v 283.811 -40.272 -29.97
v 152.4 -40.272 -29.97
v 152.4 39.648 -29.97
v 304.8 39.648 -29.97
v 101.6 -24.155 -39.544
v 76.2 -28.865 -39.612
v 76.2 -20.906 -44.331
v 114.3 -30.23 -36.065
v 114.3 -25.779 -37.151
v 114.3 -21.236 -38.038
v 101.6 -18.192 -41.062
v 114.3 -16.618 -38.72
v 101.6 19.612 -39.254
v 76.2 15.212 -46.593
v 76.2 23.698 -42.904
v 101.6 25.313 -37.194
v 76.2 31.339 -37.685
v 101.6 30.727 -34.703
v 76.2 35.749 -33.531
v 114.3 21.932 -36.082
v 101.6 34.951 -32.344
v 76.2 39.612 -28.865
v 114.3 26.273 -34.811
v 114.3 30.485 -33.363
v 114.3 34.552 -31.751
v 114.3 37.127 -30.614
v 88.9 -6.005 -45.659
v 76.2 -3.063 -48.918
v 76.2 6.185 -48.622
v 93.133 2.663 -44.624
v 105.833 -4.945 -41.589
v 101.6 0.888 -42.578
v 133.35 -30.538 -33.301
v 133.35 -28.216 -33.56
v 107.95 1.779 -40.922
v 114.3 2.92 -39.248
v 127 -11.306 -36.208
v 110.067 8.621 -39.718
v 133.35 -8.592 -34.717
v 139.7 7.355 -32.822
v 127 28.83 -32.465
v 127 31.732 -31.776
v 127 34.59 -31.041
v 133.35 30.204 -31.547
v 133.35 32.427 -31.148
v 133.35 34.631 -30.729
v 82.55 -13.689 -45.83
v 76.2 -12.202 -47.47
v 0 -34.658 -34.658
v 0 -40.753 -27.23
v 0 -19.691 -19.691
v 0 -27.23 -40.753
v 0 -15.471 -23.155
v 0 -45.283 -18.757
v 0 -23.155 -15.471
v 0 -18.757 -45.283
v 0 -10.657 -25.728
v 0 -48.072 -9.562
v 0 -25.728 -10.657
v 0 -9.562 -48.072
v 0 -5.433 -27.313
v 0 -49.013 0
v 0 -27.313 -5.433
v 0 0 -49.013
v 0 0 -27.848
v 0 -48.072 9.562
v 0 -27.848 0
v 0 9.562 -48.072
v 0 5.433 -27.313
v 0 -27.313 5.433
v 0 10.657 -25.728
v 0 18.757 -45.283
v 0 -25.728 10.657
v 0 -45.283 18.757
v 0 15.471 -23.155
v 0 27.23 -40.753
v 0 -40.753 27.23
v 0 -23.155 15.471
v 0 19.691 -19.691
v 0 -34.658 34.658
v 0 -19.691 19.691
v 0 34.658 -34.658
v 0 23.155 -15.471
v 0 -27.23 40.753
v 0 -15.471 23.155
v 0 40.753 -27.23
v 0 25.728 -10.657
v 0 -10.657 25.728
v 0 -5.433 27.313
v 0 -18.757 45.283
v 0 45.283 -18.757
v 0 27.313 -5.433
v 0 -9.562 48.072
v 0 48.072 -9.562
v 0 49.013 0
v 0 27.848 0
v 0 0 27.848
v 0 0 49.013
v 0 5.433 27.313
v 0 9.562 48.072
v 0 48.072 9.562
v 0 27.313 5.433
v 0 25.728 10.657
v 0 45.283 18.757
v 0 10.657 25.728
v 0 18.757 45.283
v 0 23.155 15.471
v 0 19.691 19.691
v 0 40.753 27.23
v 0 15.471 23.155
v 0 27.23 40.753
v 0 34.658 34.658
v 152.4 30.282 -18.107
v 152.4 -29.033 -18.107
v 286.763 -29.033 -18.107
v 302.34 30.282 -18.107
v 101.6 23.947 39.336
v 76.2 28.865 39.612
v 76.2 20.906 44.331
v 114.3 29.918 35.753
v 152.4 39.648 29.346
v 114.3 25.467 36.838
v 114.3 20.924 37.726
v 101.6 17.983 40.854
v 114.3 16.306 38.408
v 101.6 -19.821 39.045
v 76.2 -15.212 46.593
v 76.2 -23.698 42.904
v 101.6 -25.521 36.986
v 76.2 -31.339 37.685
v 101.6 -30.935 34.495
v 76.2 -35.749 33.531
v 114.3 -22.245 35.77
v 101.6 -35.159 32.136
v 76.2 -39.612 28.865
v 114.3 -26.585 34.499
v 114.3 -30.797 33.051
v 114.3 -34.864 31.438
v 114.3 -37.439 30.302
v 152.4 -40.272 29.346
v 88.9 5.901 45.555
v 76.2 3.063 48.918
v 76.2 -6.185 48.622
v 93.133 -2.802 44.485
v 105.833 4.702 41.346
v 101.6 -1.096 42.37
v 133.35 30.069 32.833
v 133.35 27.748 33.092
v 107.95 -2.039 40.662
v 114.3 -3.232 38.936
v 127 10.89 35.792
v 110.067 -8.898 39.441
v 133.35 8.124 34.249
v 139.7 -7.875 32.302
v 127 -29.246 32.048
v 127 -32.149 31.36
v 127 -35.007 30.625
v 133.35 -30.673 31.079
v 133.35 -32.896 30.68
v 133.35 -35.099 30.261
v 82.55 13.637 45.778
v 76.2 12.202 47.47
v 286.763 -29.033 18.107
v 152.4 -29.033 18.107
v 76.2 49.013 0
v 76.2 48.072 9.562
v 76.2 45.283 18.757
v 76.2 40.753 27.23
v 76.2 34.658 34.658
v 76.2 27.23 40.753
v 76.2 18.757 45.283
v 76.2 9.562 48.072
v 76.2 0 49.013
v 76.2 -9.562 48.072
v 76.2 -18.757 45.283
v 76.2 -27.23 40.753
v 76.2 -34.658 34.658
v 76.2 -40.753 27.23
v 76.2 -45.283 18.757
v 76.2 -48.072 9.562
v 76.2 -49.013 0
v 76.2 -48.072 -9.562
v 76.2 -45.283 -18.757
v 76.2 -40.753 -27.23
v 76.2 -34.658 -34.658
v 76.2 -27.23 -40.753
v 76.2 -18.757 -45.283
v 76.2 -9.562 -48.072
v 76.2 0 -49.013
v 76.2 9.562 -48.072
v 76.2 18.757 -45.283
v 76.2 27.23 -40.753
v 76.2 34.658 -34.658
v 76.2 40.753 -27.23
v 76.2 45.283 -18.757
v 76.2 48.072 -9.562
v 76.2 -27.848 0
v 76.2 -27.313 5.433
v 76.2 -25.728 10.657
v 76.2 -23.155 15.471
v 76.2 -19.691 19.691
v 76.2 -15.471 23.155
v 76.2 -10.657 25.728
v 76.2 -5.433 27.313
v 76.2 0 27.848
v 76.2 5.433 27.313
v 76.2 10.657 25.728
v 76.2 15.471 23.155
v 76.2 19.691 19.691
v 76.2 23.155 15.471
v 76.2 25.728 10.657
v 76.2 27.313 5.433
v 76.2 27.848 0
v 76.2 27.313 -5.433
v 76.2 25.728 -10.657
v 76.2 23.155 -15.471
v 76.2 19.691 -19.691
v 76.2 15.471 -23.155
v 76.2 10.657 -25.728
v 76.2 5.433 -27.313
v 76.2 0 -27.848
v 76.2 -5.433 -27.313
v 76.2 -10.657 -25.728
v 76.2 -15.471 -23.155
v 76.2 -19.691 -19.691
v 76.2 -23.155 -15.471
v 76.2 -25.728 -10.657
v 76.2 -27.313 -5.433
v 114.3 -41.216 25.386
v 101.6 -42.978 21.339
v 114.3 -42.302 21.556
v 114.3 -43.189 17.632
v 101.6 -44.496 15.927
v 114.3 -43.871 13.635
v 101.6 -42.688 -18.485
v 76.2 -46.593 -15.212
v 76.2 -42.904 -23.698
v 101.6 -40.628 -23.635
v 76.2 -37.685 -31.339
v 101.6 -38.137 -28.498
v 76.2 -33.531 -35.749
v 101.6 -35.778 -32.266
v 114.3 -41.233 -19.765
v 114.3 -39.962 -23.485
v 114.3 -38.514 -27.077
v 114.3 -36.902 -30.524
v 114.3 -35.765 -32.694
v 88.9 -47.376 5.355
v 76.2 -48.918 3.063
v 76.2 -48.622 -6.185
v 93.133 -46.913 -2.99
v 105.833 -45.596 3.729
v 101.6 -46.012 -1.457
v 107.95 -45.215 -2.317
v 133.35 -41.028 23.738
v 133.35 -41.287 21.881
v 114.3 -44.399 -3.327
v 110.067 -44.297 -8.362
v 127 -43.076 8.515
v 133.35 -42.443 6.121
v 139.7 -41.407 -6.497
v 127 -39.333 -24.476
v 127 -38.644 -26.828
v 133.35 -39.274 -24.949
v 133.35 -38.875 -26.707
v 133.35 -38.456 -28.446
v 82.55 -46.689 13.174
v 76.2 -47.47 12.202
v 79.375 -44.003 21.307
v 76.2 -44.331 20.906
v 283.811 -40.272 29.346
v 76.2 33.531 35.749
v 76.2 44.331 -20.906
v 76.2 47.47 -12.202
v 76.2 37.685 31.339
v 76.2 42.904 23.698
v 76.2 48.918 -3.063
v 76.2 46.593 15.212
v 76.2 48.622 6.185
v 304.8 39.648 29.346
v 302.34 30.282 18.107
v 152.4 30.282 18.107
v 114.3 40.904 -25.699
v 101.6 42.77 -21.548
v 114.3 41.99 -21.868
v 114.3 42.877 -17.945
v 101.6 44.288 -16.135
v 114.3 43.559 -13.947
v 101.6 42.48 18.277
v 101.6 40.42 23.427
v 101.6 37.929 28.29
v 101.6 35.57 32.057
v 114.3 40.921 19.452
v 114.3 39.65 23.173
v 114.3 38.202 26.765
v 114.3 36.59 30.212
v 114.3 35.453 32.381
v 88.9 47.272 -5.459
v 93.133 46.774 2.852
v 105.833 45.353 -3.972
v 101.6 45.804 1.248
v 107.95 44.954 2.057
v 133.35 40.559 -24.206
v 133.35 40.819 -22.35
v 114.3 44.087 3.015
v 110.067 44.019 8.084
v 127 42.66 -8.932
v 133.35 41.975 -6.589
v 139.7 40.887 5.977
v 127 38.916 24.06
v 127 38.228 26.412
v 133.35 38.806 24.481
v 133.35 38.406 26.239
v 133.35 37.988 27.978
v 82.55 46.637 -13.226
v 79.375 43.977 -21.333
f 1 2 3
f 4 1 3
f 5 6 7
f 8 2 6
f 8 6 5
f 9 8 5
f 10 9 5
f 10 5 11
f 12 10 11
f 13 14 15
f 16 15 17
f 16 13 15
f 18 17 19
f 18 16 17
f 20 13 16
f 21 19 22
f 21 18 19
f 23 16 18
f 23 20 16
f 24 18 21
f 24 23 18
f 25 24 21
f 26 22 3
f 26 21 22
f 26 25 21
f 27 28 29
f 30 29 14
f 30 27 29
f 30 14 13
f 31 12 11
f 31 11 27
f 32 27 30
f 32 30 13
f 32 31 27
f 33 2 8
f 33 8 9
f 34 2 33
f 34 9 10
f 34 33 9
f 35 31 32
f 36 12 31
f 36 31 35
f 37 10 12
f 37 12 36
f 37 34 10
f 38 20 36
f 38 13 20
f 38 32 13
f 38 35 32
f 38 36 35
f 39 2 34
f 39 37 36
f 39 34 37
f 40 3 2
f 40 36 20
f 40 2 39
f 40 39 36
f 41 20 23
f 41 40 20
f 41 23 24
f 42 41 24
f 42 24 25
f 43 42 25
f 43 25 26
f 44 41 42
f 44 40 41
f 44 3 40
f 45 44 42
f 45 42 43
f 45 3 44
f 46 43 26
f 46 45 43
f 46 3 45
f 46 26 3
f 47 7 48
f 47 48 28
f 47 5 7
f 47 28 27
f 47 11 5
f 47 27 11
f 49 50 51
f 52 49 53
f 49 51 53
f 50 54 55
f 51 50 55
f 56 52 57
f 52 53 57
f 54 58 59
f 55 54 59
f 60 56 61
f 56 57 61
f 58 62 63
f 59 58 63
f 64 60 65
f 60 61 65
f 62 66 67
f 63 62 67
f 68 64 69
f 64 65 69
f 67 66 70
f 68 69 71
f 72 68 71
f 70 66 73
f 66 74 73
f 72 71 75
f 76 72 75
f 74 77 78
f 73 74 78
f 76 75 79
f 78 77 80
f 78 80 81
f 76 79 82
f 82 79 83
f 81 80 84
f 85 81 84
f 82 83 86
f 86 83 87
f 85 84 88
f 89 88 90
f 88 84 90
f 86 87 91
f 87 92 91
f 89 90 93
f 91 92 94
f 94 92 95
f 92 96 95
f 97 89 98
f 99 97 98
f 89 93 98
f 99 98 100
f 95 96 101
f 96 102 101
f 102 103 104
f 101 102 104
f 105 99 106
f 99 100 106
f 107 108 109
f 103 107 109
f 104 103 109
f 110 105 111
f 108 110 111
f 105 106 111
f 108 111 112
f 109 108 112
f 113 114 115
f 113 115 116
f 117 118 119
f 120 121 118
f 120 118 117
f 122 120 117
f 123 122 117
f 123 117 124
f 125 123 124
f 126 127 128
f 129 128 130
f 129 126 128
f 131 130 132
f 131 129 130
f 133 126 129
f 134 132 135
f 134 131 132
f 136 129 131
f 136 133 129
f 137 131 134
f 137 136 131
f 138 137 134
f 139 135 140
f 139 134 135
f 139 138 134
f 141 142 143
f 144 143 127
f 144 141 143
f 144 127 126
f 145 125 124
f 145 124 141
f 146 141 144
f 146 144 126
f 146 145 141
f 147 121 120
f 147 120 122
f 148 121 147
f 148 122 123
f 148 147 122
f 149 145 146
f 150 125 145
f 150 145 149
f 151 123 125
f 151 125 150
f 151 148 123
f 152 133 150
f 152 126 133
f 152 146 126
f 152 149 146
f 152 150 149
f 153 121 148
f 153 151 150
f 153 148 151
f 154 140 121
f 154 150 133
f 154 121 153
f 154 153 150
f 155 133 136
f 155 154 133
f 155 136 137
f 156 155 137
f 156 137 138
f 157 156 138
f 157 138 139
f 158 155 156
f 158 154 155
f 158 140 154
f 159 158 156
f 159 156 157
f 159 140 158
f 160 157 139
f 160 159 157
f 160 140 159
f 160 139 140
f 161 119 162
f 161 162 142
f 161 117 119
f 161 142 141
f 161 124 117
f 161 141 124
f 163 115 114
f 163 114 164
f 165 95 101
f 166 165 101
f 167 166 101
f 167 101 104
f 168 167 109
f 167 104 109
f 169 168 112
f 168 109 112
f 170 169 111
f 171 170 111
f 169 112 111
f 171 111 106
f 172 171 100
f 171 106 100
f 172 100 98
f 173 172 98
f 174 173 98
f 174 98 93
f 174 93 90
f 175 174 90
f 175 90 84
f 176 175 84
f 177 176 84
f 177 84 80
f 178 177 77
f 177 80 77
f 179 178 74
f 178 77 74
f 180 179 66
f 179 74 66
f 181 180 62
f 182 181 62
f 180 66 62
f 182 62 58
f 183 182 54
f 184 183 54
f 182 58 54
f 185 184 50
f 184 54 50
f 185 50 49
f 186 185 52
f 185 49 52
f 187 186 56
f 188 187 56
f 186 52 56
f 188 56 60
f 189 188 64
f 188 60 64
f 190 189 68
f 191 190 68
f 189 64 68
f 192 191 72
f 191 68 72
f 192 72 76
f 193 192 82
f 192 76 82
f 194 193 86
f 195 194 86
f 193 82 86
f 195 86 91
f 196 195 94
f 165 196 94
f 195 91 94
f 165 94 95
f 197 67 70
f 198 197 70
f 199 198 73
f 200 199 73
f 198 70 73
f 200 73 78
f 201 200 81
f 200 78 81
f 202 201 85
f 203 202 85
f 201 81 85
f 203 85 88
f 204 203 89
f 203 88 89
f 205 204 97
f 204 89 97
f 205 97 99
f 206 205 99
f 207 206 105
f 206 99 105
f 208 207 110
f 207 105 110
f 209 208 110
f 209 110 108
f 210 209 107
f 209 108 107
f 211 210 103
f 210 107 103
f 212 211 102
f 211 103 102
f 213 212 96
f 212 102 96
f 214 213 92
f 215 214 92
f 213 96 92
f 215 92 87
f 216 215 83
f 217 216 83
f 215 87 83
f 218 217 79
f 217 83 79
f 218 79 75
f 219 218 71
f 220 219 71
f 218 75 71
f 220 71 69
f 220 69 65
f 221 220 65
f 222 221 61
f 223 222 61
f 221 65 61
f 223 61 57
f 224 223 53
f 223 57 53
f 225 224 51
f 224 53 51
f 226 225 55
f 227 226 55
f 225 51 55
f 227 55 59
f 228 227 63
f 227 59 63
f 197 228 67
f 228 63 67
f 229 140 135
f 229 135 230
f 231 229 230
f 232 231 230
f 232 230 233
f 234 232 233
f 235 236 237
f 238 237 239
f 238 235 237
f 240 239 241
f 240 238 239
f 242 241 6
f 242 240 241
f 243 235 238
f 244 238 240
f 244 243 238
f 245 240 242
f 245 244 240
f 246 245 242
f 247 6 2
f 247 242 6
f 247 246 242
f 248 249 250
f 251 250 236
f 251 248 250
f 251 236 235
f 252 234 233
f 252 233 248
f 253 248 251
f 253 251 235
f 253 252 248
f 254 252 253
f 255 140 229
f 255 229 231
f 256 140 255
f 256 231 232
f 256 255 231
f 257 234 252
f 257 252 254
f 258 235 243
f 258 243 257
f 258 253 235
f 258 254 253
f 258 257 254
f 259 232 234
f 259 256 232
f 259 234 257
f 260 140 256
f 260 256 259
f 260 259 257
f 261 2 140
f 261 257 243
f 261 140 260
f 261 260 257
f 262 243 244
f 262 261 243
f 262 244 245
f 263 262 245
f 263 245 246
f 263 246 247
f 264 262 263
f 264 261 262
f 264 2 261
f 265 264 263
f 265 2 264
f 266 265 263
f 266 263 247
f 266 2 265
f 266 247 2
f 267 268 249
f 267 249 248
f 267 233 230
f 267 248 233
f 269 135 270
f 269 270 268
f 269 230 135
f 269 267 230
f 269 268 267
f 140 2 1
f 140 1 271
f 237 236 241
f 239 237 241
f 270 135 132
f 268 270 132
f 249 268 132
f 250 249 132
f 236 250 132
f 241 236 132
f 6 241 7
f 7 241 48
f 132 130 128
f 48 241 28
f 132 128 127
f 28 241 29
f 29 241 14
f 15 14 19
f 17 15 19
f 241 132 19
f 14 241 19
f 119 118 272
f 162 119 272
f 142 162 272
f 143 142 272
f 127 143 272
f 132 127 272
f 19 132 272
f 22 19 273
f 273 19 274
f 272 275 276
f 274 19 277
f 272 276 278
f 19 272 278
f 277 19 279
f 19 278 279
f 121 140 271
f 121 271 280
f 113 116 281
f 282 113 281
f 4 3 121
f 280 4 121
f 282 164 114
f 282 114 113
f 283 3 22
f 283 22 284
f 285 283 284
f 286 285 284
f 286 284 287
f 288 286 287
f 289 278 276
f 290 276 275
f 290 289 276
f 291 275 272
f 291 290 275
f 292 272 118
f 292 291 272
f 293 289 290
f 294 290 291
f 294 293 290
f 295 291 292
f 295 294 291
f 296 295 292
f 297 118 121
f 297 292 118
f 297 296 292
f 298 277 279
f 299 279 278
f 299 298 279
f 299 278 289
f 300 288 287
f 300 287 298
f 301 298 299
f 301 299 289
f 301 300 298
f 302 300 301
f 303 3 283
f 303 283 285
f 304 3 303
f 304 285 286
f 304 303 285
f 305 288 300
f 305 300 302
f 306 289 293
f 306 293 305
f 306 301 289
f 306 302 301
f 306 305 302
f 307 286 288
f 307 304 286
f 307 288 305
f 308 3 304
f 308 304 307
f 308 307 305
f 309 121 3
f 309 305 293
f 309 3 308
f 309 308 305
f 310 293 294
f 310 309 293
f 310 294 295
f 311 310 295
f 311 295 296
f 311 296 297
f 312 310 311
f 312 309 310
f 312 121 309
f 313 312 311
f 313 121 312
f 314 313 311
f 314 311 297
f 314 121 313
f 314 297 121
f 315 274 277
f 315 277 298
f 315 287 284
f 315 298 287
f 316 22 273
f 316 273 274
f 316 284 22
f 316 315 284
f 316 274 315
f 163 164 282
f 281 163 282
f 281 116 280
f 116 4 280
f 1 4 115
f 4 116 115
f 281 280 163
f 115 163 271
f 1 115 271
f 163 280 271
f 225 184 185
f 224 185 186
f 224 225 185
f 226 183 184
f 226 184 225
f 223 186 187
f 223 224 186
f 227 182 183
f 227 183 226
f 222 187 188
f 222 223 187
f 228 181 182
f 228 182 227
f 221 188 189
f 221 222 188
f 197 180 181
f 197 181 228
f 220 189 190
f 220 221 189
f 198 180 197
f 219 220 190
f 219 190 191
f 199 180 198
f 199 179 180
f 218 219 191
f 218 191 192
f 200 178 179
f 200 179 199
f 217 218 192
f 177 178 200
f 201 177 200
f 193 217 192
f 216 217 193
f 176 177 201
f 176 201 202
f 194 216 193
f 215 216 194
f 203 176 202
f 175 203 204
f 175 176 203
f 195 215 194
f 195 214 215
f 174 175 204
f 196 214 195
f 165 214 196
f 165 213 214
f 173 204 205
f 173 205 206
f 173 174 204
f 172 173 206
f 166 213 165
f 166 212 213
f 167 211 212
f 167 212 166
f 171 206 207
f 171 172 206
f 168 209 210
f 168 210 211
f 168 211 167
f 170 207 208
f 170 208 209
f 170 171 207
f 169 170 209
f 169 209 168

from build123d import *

# Parameters (mm, degrees)
F0_R      = 49.0134805441
F1_DEPTH  = 76.2
F3_W      = 79.9200758338
F3_H      = 59.3156740069
F5_DEPTH  = 152.4
F7_DEPTH  = 59.3156740069
F9_W      = 59.3156721443
F9_H      = 36.2137816846
F10_DEPTH = 152.4
F11_R     = 27.8477837619
F12_DEPTH = 76.2


# Not quite as in the source:
# - a feature of the source that left no trace in its solid (it failed there, or was rolled back) is left out
# - the arcs of a loft's sections are written as splines that run evenly, so that the points pair up as in the source's solid


with BuildPart() as f1:
    # F0 (on Right) → F1 (new body)
    with BuildSketch(Plane.YZ):
        Circle(F0_R)
    extrude(amount=F1_DEPTH)

    # F11 (on face) → F12 (cut, through all)
    with BuildSketch(Plane(origin=(0, 0, 0), x_dir=(0, -1, 0), z_dir=(-1, 0, 0))):
        Circle(F11_R)
    extrude(amount=-F12_DEPTH, mode=Mode.SUBTRACT)


with BuildPart() as f4:
    # F1_face (on face) → F4 section 0
    with BuildSketch(Plane.YZ.offset(76.2)):
        with BuildLine():
            add(Edge.make_bspline(
                [(-39.6123992828, 28.8648419033), (-41.5015987676, 26.272216433), (-43.1354065314, 23.4935897628), (-45.8296123485, 17.6708428932), (-46.8899437823, 14.6268666727), (-48.3964196283, 8.3903887711), (-48.8425267899, 5.1980412992), (-49.1033796429, -1.2125032862), (-48.9181188841, -4.4305418863), (-47.9233243152, -10.7687995221), (-47.1138151033, -13.8888618319), (-44.9016025099, -19.9112568317), (-43.4989538297, -22.8134406061), (-40.1543373011, -28.2885357075), (-38.212452155, -30.8613116519), (-33.8639634288, -35.5787020205), (-31.4574673737, -37.723199798), (-28.8648419033, -39.6123992828)],
                knots=[0, 0, 0, 0, 0.125, 0.125, 0.25, 0.25, 0.375, 0.375, 0.5, 0.5, 0.625, 0.625, 0.75, 0.75, 0.875, 0.875, 1, 1, 1, 1], degree=3))
            add(Edge.make_bspline(
                [(-28.8648419033, -39.6123992828), (-26.272216433, -41.5015987676), (-23.4935897628, -43.1354065314), (-17.6708428932, -45.8296123485), (-14.6268666727, -46.8899437823), (-8.3903887711, -48.3964196283), (-5.1980412992, -48.8425267899), (1.2125032862, -49.1033796429), (4.4305418863, -48.9181188841), (10.7687995221, -47.9233243152), (13.8888618319, -47.1138151033), (19.9112568317, -44.9016025099), (22.8134406061, -43.4989538297), (28.2885357075, -40.1543373011), (30.8613116519, -38.212452155), (35.5787020205, -33.8639634288), (37.723199798, -31.4574673737), (39.6123992828, -28.8648419033)],
                knots=[0, 0, 0, 0, 0.125, 0.125, 0.25, 0.25, 0.375, 0.375, 0.5, 0.5, 0.625, 0.625, 0.75, 0.75, 0.875, 0.875, 1, 1, 1, 1], degree=3))
            add(Edge.make_bspline(
                [(39.6123992828, -28.8648419033), (41.5015987676, -26.272216433), (43.1354065314, -23.4935897628), (45.8296123485, -17.6708428932), (46.8899437823, -14.6268666727), (48.3964196283, -8.3903887711), (48.8425267899, -5.1980412992), (49.1033796429, 1.2125032862), (48.9181188841, 4.4305418863), (47.9233243152, 10.7687995221), (47.1138151033, 13.8888618319), (44.9016025099, 19.9112568317), (43.4989538297, 22.8134406061), (40.1543373011, 28.2885357075), (38.212452155, 30.8613116519), (33.8639634288, 35.5787020205), (31.4574673737, 37.723199798), (28.8648419033, 39.6123992828)],
                knots=[0, 0, 0, 0, 0.125, 0.125, 0.25, 0.25, 0.375, 0.375, 0.5, 0.5, 0.625, 0.625, 0.75, 0.75, 0.875, 0.875, 1, 1, 1, 1], degree=3))
            add(Edge.make_bspline(
                [(28.8648419033, 39.6123992828), (26.272216433, 41.5015987676), (23.4935897628, 43.1354065314), (17.6708428932, 45.8296123485), (14.6268666727, 46.8899437823), (8.3903887711, 48.3964196283), (5.1980412992, 48.8425267899), (-1.2125032862, 49.1033796429), (-4.4305418863, 48.9181188841), (-10.7687995221, 47.9233243152), (-13.8888618319, 47.1138151033), (-19.9112568317, 44.9016025099), (-22.8134406061, 43.4989538297), (-28.2885357075, 40.1543373011), (-30.8613116519, 38.212452155), (-35.5787020205, 33.8639634288), (-37.723199798, 31.4574673737), (-39.6123992828, 28.8648419033)],
                knots=[0, 0, 0, 0, 0.125, 0.125, 0.25, 0.25, 0.375, 0.375, 0.5, 0.5, 0.625, 0.625, 0.75, 0.75, 0.875, 0.875, 1, 1, 1, 1], degree=3))
        make_face()
    # F3 (on offset) → F4 section 1
    with BuildSketch(Plane.YZ.offset(152.4)):
        with Locations((-0.3121942282, -0.3121867776)):
            Rectangle(F3_W, F3_H)
    loft(ruled=True)

    # F5 (add): a face of the model
    f5_faces = [f4.faces().sort_by_distance(p)[0] for p in [
        (152.4, -0.3121942282, -0.3121867776),
    ]]
    extrude(f5_faces, amount=F5_DEPTH)

    # F6 (on face) → F7 (cut, through all)
    with BuildSketch(Plane.XY.offset(29.3456502259)):
        Polygon((304.8, -40.2722321451), (304.8, 39.6478436887), (283.8114500046, -40.2722321451), align=None)
    extrude(amount=-F7_DEPTH, mode=Mode.SUBTRACT)

    # F9 (on offset) → F10 (cut)
    with BuildSketch(Plane.YZ.offset(304.8)):
        with Locations((0.6243688986, 3.7253e-06)):
            Rectangle(F9_W, F9_H)
    extrude(amount=-F10_DEPTH, mode=Mode.SUBTRACT)


solid = Compound([f1.part, f4.part])
